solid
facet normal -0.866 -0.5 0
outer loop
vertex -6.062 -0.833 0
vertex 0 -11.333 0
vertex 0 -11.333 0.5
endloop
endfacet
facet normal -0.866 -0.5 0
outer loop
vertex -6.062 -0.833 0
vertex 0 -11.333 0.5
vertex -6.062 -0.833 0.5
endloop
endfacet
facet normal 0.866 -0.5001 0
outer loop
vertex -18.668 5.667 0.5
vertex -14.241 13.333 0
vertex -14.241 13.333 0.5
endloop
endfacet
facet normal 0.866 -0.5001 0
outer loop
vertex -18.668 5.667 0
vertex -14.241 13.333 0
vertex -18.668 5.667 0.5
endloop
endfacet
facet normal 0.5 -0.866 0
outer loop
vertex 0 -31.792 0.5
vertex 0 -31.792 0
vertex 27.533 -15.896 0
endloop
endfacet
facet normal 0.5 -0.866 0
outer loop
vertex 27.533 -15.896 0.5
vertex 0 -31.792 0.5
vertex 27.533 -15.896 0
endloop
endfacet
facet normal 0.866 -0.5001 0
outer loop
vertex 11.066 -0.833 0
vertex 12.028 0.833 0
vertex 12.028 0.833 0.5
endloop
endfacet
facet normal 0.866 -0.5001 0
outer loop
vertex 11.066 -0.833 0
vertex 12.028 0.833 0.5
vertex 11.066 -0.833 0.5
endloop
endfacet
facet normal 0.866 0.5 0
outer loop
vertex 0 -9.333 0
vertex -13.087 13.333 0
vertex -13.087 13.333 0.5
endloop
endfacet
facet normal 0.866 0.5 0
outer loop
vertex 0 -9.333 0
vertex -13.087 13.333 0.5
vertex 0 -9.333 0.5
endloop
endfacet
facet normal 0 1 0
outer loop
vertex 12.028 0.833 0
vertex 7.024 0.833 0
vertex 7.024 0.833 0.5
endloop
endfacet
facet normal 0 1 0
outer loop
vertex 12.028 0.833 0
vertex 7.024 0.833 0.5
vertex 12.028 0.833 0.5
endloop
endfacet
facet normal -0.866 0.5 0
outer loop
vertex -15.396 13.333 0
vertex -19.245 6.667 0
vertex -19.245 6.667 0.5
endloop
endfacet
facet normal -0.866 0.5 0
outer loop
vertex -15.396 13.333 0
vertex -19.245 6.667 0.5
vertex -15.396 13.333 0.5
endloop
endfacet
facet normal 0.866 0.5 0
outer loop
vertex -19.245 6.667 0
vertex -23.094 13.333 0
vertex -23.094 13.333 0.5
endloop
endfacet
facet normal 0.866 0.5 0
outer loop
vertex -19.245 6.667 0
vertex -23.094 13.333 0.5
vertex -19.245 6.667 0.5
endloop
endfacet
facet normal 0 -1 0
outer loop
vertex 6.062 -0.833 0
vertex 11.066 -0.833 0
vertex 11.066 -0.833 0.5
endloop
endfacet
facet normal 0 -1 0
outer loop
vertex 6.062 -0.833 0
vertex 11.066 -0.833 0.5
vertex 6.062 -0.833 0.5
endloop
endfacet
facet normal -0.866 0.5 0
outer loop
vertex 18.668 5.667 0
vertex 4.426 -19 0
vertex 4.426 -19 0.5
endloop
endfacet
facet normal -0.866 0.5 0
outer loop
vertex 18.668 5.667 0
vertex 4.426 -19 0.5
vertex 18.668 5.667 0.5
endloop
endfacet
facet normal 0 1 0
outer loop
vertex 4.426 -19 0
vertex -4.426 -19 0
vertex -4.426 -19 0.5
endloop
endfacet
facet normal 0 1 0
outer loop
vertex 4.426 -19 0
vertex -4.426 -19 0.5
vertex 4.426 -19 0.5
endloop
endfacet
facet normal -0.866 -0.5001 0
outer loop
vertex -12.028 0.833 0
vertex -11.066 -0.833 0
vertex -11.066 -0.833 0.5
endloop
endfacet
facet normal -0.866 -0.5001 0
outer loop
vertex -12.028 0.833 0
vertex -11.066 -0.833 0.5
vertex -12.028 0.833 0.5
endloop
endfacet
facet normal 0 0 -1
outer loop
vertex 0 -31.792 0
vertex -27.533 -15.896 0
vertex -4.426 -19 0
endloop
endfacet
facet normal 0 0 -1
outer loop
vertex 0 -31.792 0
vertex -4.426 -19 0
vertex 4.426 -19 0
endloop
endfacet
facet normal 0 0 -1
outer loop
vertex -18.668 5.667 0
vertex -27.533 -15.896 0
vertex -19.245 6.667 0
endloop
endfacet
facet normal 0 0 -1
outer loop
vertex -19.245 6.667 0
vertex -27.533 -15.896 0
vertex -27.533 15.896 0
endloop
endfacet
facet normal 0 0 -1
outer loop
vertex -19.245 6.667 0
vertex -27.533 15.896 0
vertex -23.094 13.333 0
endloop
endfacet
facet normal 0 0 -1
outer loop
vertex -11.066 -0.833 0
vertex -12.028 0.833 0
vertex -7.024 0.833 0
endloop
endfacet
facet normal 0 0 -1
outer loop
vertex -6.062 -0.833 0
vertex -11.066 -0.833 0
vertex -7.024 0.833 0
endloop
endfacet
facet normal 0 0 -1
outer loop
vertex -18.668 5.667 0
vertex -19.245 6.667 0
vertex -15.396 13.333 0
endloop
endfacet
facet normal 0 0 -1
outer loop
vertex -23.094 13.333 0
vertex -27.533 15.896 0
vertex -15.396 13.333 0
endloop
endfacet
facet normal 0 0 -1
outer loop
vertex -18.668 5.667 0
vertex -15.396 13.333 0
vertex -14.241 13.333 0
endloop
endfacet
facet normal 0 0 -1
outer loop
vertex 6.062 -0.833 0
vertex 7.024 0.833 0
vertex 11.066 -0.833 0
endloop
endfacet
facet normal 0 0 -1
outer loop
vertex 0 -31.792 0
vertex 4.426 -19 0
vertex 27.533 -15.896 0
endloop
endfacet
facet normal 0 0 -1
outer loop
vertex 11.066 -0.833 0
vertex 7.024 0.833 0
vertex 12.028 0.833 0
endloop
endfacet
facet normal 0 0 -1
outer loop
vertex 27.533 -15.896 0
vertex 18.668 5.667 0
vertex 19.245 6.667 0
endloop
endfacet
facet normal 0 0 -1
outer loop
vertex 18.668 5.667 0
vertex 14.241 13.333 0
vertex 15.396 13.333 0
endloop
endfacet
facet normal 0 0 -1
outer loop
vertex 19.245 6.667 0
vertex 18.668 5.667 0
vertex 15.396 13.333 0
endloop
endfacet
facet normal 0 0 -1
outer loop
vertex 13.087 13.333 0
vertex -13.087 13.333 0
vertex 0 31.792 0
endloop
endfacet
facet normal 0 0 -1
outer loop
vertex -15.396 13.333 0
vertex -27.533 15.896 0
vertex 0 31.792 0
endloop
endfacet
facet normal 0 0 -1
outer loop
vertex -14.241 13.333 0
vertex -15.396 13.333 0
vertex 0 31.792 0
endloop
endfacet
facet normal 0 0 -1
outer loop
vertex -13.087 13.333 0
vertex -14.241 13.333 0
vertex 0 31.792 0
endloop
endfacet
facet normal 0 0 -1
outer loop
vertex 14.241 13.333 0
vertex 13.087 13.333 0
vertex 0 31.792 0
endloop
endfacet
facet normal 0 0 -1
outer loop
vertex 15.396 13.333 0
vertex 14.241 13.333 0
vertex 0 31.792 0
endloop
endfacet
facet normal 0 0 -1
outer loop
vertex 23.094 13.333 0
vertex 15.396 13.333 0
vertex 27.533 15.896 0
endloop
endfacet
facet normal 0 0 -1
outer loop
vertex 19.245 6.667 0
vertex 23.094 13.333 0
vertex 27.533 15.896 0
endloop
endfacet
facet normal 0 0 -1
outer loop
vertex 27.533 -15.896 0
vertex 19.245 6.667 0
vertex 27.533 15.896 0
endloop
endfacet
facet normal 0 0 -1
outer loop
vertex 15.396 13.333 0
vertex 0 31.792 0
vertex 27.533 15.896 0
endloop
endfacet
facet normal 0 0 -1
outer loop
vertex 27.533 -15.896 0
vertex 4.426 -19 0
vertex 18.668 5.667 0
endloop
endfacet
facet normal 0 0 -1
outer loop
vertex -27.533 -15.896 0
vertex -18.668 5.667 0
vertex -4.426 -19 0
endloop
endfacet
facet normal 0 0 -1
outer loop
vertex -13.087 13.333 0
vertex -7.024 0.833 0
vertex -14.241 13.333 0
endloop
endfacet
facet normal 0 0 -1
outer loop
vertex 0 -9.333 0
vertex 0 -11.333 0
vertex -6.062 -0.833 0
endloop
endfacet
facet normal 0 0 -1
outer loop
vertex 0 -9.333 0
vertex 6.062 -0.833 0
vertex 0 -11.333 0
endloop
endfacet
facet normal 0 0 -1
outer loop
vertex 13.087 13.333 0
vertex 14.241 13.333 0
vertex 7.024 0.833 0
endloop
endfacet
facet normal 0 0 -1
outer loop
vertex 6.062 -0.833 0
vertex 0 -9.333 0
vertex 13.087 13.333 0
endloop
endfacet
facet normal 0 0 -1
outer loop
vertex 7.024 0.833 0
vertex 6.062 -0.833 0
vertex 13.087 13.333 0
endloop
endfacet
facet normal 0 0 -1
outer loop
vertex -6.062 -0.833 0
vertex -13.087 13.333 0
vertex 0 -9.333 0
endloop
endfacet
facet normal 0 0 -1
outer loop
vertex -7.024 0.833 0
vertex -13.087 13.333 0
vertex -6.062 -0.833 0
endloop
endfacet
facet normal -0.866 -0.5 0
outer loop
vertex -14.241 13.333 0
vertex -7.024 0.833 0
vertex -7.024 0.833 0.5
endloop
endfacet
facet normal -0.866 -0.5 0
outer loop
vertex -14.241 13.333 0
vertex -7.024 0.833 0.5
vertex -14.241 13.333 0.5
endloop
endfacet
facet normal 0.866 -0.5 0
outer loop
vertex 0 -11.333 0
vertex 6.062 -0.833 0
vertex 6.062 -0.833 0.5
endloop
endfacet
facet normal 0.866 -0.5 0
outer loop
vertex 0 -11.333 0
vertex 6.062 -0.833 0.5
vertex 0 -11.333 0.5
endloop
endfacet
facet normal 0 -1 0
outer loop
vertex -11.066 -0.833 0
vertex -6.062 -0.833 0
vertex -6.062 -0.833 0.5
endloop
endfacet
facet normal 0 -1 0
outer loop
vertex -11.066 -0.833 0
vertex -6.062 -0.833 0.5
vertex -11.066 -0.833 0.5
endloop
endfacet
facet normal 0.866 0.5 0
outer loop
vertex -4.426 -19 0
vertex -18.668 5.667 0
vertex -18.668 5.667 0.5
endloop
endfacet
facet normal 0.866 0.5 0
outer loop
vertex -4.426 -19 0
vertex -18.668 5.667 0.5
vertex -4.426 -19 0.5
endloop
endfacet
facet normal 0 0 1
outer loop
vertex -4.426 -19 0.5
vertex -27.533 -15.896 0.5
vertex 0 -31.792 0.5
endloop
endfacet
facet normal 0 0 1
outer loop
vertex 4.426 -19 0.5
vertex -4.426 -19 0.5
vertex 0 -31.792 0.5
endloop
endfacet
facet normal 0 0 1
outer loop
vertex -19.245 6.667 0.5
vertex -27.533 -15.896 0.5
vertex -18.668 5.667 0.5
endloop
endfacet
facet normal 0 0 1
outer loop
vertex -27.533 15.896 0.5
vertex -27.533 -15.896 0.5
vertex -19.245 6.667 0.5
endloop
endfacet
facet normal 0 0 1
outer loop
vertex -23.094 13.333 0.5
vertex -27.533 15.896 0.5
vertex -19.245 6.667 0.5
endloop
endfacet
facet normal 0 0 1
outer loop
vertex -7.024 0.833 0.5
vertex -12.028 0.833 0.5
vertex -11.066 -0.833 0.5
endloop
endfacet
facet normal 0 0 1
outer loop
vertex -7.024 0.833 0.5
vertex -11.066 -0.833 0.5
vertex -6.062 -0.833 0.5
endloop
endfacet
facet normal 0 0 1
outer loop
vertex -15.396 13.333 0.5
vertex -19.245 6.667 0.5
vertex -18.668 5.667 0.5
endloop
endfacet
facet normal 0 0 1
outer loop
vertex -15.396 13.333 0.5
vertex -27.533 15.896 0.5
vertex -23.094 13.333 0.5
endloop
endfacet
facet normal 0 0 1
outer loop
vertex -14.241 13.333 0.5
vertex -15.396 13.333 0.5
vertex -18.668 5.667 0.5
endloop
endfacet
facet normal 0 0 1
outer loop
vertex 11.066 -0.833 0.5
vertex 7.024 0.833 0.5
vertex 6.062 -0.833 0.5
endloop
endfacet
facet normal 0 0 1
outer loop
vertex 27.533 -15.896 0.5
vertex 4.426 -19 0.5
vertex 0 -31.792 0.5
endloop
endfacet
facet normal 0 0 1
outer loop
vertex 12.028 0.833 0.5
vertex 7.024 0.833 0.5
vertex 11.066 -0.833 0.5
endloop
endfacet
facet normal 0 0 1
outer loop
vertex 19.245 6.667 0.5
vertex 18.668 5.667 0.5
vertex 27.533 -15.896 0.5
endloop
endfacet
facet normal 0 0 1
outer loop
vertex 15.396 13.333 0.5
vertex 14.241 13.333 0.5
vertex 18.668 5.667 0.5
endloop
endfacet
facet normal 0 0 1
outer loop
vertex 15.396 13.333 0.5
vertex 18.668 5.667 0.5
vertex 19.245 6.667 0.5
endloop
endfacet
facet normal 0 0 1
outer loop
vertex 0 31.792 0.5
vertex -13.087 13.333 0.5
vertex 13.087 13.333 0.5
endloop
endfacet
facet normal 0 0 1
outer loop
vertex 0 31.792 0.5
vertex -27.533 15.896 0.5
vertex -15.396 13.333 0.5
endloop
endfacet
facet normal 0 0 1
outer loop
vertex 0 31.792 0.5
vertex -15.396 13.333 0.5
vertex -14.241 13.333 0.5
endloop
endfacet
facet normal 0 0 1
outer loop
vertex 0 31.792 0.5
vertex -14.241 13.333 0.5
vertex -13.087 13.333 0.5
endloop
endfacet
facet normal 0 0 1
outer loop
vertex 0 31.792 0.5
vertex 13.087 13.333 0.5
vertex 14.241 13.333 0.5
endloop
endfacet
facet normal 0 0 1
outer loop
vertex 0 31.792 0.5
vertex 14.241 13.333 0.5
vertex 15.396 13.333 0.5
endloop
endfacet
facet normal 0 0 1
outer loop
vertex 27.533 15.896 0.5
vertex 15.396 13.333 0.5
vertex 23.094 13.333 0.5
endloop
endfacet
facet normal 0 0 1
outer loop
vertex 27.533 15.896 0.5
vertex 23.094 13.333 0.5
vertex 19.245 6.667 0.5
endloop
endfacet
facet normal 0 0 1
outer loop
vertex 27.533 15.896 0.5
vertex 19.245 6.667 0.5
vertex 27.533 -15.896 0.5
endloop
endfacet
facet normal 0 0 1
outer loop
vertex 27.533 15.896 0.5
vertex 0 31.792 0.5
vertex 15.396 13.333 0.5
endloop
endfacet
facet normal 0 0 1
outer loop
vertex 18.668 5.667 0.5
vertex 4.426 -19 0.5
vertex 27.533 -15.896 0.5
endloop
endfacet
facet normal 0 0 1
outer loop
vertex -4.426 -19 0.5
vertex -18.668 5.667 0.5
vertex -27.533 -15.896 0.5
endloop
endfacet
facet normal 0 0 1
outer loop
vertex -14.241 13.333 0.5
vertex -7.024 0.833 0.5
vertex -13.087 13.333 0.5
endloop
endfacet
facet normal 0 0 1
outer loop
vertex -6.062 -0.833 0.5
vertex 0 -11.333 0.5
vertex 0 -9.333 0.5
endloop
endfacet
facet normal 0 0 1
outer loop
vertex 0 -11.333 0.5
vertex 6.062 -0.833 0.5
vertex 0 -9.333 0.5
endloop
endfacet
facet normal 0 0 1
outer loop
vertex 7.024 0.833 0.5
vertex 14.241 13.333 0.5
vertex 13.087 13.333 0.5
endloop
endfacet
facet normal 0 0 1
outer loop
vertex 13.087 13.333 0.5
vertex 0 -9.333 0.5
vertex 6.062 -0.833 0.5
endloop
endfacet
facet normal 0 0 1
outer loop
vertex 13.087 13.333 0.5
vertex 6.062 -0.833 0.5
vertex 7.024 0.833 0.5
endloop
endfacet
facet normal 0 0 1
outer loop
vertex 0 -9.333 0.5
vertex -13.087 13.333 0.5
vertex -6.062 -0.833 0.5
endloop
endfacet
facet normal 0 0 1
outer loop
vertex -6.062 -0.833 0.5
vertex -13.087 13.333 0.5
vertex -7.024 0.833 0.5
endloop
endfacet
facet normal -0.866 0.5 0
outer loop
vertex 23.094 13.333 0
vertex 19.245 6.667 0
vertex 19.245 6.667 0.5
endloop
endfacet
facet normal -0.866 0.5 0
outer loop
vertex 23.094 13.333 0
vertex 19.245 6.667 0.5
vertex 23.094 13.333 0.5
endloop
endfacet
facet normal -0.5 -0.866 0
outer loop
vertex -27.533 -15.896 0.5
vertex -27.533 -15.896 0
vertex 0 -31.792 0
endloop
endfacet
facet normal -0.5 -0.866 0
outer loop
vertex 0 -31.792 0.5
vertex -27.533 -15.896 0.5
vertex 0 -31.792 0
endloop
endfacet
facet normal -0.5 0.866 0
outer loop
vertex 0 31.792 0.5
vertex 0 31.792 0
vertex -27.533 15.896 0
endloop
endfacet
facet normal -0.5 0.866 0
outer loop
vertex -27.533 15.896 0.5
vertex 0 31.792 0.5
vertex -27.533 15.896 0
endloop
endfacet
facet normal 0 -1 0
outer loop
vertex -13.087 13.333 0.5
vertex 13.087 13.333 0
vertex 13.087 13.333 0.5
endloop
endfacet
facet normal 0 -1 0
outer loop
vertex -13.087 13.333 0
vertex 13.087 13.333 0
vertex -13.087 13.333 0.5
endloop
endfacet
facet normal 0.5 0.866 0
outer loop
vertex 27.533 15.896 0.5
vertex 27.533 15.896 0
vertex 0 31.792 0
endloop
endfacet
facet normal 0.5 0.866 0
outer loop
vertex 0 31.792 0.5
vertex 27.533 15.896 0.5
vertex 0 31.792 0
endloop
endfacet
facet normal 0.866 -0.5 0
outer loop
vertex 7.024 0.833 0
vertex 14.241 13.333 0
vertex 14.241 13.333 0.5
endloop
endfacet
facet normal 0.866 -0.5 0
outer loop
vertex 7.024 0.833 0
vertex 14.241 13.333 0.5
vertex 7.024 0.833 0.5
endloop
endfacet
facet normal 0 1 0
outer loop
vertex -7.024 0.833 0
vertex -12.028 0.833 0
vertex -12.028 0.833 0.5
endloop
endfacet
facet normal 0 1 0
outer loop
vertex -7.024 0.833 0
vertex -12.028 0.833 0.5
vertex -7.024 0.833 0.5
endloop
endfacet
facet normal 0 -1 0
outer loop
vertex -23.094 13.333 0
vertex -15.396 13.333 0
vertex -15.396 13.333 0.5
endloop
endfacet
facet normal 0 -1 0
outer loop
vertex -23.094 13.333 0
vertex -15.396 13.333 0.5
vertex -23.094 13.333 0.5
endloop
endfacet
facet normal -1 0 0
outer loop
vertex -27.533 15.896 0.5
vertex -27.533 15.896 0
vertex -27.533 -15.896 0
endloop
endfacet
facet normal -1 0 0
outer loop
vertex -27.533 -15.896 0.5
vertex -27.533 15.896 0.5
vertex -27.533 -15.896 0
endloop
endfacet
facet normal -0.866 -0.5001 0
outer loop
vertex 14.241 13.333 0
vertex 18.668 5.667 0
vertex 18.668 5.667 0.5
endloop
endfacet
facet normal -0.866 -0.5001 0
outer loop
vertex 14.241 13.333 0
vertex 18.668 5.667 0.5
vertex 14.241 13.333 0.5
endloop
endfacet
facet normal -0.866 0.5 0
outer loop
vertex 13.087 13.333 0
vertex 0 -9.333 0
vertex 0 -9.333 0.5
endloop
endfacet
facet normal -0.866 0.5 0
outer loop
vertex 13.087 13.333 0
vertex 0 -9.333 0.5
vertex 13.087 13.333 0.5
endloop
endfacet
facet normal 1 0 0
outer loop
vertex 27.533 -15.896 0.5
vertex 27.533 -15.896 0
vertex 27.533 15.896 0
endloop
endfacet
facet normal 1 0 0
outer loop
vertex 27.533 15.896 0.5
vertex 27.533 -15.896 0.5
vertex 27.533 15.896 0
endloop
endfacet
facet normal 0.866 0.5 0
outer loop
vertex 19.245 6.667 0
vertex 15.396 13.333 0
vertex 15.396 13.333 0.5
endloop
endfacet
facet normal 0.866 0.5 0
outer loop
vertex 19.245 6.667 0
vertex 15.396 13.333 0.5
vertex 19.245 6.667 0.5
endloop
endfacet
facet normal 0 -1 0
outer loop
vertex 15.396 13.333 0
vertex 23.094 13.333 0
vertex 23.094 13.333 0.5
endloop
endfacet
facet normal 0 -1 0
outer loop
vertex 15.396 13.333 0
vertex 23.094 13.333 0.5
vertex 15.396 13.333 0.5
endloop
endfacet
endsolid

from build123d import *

# Parameters (mm, degrees)
BOSS_EXTRUDE1_DEPTH = 0.5


with BuildPart() as part:
    # Sketch1 → Boss-Extrude1 (new body)
    with BuildSketch(Plane.XY):
        Polygon((27.53269207, 15.896007178), (0, 31.792014357), (-27.53269207, 15.896007178), (-27.53269207, -15.896007178), (0, -31.792014357), (27.53269207, -15.896007178), align=None)
        Polygon((23.094010768, 13.333333333), (15.396007178, 13.333333333), (19.245008973, 6.666666667), align=None, mode=Mode.SUBTRACT)
        Polygon((4.426352064, -19), (18.667658704, 5.666666667), (14.24130664, 13.333333333), (7.024428275, 0.833333333), (12.028130608, 0.833333333), (11.065880159, -0.833333333), (6.062177826, -0.833333333), (0, -11.333333333), (-6.062177826, -0.833333333), (-11.065880159, -0.833333333), (-12.028130608, 0.833333333), (-7.024428275, 0.833333333), (-14.24130664, 13.333333333), (-18.667658704, 5.666666667), (-4.426352064, -19), align=None, mode=Mode.SUBTRACT)
        Polygon((0, -9.333333333), (13.086606102, 13.333333333), (-13.086606102, 13.333333333), align=None, mode=Mode.SUBTRACT)
        Polygon((-23.094010768, 13.333333333), (-19.245008973, 6.666666667), (-15.396007178, 13.333333333), align=None, mode=Mode.SUBTRACT)
    extrude(amount=BOSS_EXTRUDE1_DEPTH)


solid = part.part
